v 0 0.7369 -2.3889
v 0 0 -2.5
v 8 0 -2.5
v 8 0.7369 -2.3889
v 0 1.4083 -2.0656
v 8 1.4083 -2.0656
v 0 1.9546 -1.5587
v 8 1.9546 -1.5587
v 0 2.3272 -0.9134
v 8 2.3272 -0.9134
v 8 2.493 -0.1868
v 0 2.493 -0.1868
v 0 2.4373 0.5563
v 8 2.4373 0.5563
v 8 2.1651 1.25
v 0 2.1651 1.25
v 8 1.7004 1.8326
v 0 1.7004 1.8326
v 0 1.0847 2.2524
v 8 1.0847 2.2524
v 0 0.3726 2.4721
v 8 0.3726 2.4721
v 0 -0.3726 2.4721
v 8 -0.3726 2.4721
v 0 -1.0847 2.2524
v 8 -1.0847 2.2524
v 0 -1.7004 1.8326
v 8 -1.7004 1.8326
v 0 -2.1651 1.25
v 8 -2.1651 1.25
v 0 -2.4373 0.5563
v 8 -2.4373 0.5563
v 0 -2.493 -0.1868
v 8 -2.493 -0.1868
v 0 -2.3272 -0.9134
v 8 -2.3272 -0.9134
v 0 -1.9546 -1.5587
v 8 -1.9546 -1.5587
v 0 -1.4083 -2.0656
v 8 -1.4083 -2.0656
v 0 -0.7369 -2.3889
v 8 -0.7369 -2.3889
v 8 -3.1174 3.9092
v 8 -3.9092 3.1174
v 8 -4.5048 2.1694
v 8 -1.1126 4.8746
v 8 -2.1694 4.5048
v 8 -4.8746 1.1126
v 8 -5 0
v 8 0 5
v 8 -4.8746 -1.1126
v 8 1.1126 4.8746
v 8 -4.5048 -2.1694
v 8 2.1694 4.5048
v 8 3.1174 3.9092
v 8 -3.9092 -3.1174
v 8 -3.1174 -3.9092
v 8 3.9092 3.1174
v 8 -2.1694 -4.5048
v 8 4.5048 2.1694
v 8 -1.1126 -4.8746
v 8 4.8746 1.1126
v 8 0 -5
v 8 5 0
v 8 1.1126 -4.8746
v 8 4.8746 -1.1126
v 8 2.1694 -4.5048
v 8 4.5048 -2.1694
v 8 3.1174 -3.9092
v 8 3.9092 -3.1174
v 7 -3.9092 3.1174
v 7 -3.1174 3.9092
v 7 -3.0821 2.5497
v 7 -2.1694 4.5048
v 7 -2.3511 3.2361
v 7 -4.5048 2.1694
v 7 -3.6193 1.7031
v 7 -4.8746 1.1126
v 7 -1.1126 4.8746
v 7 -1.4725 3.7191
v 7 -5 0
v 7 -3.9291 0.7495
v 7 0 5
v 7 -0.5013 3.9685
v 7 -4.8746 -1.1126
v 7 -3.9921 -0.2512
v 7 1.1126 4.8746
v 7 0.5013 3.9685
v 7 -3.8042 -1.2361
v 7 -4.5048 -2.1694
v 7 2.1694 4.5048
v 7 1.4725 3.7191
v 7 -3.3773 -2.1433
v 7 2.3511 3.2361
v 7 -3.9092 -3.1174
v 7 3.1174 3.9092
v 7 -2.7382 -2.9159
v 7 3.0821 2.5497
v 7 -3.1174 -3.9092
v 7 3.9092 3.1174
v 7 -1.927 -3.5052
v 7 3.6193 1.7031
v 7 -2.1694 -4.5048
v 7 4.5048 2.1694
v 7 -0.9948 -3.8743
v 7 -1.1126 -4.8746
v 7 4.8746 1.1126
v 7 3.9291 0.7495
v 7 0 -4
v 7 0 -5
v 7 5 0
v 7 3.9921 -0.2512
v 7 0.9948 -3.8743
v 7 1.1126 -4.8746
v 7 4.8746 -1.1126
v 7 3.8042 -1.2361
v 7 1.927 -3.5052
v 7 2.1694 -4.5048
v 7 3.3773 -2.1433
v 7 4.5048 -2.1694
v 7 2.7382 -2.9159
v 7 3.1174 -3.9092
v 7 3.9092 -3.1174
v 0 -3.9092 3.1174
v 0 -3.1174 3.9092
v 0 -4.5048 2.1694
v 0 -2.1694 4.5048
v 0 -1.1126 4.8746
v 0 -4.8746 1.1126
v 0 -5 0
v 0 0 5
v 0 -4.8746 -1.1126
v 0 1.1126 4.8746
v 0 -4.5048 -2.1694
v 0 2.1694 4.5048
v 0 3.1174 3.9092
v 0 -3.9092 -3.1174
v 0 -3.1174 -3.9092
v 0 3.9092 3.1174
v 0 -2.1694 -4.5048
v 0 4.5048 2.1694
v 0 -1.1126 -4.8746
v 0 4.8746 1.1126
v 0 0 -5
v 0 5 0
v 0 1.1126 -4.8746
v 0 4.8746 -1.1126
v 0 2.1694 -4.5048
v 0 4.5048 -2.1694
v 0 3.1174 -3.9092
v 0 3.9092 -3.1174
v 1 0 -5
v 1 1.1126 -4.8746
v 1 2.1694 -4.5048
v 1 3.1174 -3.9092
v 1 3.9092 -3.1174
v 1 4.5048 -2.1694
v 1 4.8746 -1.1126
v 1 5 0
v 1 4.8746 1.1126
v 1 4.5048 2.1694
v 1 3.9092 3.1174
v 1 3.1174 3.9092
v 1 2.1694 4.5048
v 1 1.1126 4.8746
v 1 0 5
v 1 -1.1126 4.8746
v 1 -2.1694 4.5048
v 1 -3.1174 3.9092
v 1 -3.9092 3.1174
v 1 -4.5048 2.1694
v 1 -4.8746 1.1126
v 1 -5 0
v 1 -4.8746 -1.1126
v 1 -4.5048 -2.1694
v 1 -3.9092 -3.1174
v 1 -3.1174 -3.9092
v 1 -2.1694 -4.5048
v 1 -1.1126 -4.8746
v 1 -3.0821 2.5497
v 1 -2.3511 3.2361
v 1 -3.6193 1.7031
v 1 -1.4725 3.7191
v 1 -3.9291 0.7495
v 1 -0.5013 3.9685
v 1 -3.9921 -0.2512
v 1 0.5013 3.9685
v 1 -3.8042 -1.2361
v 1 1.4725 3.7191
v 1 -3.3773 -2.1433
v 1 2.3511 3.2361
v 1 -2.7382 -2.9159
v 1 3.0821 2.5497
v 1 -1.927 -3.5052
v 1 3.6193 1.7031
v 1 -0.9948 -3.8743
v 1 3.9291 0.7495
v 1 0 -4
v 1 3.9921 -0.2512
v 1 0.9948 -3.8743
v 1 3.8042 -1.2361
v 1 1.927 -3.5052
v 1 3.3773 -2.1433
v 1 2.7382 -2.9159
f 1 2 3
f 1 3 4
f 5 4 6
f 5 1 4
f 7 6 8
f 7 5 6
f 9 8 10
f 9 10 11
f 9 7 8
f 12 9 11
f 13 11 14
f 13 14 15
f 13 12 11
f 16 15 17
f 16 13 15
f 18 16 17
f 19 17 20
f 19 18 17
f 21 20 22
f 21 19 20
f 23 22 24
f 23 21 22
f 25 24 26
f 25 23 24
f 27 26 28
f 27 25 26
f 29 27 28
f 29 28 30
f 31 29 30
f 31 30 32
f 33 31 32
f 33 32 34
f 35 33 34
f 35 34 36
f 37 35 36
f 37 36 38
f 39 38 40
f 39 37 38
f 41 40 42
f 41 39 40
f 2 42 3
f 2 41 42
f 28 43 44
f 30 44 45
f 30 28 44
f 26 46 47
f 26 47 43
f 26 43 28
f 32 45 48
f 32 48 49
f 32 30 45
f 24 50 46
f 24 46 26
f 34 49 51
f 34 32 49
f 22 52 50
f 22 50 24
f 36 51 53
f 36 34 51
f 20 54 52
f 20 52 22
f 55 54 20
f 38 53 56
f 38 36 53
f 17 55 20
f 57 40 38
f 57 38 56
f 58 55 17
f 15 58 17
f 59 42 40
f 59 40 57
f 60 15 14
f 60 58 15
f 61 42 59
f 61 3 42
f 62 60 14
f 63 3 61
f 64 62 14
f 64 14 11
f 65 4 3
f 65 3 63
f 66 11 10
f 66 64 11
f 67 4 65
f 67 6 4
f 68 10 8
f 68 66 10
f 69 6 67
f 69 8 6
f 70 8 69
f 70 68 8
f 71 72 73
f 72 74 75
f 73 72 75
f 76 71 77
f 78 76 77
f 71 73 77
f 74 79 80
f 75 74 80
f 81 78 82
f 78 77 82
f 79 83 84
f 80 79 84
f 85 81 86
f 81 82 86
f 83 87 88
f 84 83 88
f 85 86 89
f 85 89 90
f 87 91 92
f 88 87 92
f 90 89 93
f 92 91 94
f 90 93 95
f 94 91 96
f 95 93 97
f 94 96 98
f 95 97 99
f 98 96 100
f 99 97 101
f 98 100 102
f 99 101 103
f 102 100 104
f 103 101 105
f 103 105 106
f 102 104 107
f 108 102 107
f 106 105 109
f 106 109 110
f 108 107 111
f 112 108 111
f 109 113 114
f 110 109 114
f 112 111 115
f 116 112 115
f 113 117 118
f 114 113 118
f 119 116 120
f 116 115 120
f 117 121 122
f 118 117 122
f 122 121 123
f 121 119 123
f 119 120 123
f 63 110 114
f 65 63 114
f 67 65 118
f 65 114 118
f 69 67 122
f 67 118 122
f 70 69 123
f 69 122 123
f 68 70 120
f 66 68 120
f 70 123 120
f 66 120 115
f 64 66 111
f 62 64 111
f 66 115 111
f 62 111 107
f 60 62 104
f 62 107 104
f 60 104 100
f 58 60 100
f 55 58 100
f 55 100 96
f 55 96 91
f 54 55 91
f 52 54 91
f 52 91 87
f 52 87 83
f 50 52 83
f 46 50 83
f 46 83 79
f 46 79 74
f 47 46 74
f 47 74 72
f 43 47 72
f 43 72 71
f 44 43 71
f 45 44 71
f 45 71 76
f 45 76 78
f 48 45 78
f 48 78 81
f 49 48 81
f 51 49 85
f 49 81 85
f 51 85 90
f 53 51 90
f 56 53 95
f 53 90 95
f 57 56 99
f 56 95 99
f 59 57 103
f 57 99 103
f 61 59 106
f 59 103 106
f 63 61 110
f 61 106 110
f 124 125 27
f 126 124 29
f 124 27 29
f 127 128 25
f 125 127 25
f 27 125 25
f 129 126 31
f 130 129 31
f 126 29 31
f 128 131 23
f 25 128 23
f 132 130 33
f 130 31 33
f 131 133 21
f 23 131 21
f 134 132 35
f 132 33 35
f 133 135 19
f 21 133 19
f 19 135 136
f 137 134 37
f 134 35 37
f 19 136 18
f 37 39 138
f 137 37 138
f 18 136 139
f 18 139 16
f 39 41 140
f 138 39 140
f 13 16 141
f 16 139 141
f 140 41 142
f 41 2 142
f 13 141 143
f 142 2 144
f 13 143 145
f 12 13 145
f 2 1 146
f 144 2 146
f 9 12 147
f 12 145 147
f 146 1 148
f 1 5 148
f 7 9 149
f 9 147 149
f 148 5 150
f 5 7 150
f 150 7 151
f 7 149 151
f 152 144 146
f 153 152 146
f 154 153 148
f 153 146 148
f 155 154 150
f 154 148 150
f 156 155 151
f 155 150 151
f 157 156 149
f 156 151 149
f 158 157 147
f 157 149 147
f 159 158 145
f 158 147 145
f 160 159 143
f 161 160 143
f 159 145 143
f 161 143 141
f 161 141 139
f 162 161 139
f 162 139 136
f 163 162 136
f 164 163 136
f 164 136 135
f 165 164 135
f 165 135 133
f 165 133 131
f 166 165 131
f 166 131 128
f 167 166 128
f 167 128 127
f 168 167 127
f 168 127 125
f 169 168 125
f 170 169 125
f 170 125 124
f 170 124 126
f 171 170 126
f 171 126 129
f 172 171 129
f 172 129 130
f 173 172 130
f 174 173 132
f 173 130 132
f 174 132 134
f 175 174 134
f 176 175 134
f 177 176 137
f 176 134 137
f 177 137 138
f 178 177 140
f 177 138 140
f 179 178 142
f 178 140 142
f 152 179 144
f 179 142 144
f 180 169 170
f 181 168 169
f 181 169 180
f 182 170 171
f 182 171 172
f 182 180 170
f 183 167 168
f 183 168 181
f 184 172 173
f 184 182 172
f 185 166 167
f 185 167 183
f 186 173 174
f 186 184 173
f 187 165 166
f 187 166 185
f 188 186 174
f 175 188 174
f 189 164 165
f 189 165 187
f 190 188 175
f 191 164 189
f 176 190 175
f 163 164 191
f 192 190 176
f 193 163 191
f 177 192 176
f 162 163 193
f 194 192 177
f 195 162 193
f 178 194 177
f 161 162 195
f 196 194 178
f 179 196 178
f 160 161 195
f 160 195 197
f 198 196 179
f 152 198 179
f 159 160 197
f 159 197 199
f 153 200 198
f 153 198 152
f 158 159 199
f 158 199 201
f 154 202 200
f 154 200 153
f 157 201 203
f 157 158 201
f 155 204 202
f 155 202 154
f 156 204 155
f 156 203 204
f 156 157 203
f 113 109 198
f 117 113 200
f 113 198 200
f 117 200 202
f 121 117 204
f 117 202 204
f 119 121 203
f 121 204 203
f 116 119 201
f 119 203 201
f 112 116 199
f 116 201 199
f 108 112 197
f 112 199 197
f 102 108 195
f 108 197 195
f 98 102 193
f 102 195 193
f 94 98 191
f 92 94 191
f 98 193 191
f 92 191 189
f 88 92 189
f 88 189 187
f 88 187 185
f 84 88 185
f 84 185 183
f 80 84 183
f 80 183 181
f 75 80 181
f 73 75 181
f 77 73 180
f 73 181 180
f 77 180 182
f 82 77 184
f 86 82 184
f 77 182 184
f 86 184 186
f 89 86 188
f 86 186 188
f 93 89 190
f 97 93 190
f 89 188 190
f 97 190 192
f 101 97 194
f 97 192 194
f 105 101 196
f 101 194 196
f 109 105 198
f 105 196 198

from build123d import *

# Parameters (mm, degrees)
SKETCH_1_R          = 5
SKETCH_1_R_2        = 2.5
EXTRUDE_1_DEPTH     = 8
SKETCH_2_R          = 5
SKETCH_2_R_2        = 4
CUT_EXTRUDE_1_DEPTH = 3


with BuildPart() as part:
    # 草图1 → 凸台-拉伸1 (new body)
    with BuildSketch(Plane(origin=(0, 0, 0), x_dir=(0, 0, -1), z_dir=(1, 0, 0))):
        Circle(SKETCH_1_R)
        Circle(SKETCH_1_R_2, mode=Mode.SUBTRACT)
    extrude(amount=EXTRUDE_1_DEPTH)

    # 草图2 → 切除-拉伸1 (cut, symmetric)
    with BuildSketch(Plane(origin=(4, 0, 0), x_dir=(0, 0, -1), z_dir=(1, 0, 0))):
        Circle(SKETCH_2_R)
        Circle(SKETCH_2_R_2, mode=Mode.SUBTRACT)
    extrude(amount=CUT_EXTRUDE_1_DEPTH, both=True, mode=Mode.SUBTRACT)


solid = part.part
